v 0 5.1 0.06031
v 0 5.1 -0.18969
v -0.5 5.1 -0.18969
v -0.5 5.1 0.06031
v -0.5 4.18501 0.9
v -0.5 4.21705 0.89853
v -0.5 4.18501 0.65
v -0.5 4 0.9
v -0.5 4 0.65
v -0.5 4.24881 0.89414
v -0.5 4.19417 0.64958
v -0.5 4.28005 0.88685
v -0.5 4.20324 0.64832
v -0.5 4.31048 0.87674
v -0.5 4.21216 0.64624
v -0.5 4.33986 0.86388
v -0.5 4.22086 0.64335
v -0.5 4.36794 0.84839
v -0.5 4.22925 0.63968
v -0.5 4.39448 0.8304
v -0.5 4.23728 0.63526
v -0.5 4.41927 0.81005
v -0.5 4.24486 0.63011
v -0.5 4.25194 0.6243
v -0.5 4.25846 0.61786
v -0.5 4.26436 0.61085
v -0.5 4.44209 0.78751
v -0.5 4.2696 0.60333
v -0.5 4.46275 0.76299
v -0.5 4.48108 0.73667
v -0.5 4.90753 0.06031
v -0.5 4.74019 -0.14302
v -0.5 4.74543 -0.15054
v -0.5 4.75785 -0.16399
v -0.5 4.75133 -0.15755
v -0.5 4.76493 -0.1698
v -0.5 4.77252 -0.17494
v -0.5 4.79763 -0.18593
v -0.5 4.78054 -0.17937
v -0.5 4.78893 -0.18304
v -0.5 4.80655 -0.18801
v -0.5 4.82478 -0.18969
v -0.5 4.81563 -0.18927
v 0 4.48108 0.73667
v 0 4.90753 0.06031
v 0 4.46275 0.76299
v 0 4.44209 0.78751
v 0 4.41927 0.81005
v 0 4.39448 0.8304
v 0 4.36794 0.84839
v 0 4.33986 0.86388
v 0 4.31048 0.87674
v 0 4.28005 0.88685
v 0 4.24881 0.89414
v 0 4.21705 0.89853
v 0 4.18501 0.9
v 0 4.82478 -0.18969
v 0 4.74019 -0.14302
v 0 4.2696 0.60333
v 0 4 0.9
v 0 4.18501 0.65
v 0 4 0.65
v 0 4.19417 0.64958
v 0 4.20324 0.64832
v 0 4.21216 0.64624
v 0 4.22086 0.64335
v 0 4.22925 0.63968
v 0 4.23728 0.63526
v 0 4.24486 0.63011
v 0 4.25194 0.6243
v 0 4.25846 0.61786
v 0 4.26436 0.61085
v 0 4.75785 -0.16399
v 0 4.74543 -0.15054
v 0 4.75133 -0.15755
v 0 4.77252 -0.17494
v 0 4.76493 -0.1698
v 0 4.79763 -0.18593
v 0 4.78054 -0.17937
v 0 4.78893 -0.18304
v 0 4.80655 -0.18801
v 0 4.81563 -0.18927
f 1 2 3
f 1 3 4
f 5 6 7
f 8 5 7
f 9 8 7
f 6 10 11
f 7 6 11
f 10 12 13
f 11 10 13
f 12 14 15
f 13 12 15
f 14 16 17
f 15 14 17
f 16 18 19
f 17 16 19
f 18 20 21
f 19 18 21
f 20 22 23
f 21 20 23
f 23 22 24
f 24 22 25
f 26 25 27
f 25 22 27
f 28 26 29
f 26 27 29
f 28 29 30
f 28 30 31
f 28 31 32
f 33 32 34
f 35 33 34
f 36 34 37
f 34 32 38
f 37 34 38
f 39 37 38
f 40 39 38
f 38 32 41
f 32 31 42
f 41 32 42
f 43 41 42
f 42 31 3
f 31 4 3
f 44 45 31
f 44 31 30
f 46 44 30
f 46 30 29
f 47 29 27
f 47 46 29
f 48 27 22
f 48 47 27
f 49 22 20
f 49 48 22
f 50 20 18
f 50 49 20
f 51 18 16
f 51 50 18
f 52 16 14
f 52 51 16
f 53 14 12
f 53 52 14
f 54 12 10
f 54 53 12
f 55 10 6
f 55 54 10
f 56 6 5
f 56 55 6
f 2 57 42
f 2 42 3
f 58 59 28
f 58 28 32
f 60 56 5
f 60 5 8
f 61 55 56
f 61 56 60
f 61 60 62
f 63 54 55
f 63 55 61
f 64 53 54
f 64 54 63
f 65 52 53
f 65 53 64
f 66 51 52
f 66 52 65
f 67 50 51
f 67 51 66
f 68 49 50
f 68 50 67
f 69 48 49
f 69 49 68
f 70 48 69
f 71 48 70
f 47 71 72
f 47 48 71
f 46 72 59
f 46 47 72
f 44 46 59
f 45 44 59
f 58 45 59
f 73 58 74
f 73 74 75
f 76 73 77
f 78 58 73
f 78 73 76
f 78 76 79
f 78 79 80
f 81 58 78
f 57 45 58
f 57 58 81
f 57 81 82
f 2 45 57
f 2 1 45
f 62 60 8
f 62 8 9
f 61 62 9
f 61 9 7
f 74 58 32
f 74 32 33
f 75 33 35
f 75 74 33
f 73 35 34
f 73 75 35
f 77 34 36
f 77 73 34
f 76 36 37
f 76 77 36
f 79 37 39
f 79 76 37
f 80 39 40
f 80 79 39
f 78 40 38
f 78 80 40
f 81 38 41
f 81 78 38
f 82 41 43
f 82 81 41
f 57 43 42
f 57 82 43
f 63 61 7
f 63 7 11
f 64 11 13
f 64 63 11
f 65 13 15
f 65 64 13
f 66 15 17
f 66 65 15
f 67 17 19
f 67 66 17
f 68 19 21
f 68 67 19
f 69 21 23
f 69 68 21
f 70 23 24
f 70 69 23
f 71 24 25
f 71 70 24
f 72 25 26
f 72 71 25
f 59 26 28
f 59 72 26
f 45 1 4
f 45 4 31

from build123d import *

# Parameters (mm, degrees)
BOSS_EXTRU_1_DEPTH = 0.5


with BuildPart() as part:
    # Esquisse1 → Boss.-Extru.1 (new body)
    with BuildSketch(Plane.ZY):
        with BuildLine():
            Line((0.65, 4), (0.65, 4.185012068))
            ThreePointArc((0.65, 4.185012068), (0.637559943, 4.23331586), (0.603334874, 4.269601613))
            Line((0.603334874, 4.269601613), (-0.143023698, 4.740190977))
            ThreePointArc((-0.143023698, 4.740190977), (-0.177248768, 4.776476731), (-0.189688824, 4.824780523))
            Line((-0.189688824, 4.824780523), (-0.189688824, 5.1))
            Line((-0.189688824, 5.1), (0.060311176, 5.1))
            Line((0.060311176, 5.1), (0.060311176, 4.907530334))
            Line((0.060311176, 4.907530334), (0.736672059, 4.481075477))
            ThreePointArc((0.736672059, 4.481075477), (0.856459802, 4.354075339), (0.9, 4.185012068))
            Line((0.9, 4.185012068), (0.9, 4))
            Line((0.9, 4), (0.65, 4))
        make_face()
    extrude(amount=BOSS_EXTRU_1_DEPTH)


solid = part.part
